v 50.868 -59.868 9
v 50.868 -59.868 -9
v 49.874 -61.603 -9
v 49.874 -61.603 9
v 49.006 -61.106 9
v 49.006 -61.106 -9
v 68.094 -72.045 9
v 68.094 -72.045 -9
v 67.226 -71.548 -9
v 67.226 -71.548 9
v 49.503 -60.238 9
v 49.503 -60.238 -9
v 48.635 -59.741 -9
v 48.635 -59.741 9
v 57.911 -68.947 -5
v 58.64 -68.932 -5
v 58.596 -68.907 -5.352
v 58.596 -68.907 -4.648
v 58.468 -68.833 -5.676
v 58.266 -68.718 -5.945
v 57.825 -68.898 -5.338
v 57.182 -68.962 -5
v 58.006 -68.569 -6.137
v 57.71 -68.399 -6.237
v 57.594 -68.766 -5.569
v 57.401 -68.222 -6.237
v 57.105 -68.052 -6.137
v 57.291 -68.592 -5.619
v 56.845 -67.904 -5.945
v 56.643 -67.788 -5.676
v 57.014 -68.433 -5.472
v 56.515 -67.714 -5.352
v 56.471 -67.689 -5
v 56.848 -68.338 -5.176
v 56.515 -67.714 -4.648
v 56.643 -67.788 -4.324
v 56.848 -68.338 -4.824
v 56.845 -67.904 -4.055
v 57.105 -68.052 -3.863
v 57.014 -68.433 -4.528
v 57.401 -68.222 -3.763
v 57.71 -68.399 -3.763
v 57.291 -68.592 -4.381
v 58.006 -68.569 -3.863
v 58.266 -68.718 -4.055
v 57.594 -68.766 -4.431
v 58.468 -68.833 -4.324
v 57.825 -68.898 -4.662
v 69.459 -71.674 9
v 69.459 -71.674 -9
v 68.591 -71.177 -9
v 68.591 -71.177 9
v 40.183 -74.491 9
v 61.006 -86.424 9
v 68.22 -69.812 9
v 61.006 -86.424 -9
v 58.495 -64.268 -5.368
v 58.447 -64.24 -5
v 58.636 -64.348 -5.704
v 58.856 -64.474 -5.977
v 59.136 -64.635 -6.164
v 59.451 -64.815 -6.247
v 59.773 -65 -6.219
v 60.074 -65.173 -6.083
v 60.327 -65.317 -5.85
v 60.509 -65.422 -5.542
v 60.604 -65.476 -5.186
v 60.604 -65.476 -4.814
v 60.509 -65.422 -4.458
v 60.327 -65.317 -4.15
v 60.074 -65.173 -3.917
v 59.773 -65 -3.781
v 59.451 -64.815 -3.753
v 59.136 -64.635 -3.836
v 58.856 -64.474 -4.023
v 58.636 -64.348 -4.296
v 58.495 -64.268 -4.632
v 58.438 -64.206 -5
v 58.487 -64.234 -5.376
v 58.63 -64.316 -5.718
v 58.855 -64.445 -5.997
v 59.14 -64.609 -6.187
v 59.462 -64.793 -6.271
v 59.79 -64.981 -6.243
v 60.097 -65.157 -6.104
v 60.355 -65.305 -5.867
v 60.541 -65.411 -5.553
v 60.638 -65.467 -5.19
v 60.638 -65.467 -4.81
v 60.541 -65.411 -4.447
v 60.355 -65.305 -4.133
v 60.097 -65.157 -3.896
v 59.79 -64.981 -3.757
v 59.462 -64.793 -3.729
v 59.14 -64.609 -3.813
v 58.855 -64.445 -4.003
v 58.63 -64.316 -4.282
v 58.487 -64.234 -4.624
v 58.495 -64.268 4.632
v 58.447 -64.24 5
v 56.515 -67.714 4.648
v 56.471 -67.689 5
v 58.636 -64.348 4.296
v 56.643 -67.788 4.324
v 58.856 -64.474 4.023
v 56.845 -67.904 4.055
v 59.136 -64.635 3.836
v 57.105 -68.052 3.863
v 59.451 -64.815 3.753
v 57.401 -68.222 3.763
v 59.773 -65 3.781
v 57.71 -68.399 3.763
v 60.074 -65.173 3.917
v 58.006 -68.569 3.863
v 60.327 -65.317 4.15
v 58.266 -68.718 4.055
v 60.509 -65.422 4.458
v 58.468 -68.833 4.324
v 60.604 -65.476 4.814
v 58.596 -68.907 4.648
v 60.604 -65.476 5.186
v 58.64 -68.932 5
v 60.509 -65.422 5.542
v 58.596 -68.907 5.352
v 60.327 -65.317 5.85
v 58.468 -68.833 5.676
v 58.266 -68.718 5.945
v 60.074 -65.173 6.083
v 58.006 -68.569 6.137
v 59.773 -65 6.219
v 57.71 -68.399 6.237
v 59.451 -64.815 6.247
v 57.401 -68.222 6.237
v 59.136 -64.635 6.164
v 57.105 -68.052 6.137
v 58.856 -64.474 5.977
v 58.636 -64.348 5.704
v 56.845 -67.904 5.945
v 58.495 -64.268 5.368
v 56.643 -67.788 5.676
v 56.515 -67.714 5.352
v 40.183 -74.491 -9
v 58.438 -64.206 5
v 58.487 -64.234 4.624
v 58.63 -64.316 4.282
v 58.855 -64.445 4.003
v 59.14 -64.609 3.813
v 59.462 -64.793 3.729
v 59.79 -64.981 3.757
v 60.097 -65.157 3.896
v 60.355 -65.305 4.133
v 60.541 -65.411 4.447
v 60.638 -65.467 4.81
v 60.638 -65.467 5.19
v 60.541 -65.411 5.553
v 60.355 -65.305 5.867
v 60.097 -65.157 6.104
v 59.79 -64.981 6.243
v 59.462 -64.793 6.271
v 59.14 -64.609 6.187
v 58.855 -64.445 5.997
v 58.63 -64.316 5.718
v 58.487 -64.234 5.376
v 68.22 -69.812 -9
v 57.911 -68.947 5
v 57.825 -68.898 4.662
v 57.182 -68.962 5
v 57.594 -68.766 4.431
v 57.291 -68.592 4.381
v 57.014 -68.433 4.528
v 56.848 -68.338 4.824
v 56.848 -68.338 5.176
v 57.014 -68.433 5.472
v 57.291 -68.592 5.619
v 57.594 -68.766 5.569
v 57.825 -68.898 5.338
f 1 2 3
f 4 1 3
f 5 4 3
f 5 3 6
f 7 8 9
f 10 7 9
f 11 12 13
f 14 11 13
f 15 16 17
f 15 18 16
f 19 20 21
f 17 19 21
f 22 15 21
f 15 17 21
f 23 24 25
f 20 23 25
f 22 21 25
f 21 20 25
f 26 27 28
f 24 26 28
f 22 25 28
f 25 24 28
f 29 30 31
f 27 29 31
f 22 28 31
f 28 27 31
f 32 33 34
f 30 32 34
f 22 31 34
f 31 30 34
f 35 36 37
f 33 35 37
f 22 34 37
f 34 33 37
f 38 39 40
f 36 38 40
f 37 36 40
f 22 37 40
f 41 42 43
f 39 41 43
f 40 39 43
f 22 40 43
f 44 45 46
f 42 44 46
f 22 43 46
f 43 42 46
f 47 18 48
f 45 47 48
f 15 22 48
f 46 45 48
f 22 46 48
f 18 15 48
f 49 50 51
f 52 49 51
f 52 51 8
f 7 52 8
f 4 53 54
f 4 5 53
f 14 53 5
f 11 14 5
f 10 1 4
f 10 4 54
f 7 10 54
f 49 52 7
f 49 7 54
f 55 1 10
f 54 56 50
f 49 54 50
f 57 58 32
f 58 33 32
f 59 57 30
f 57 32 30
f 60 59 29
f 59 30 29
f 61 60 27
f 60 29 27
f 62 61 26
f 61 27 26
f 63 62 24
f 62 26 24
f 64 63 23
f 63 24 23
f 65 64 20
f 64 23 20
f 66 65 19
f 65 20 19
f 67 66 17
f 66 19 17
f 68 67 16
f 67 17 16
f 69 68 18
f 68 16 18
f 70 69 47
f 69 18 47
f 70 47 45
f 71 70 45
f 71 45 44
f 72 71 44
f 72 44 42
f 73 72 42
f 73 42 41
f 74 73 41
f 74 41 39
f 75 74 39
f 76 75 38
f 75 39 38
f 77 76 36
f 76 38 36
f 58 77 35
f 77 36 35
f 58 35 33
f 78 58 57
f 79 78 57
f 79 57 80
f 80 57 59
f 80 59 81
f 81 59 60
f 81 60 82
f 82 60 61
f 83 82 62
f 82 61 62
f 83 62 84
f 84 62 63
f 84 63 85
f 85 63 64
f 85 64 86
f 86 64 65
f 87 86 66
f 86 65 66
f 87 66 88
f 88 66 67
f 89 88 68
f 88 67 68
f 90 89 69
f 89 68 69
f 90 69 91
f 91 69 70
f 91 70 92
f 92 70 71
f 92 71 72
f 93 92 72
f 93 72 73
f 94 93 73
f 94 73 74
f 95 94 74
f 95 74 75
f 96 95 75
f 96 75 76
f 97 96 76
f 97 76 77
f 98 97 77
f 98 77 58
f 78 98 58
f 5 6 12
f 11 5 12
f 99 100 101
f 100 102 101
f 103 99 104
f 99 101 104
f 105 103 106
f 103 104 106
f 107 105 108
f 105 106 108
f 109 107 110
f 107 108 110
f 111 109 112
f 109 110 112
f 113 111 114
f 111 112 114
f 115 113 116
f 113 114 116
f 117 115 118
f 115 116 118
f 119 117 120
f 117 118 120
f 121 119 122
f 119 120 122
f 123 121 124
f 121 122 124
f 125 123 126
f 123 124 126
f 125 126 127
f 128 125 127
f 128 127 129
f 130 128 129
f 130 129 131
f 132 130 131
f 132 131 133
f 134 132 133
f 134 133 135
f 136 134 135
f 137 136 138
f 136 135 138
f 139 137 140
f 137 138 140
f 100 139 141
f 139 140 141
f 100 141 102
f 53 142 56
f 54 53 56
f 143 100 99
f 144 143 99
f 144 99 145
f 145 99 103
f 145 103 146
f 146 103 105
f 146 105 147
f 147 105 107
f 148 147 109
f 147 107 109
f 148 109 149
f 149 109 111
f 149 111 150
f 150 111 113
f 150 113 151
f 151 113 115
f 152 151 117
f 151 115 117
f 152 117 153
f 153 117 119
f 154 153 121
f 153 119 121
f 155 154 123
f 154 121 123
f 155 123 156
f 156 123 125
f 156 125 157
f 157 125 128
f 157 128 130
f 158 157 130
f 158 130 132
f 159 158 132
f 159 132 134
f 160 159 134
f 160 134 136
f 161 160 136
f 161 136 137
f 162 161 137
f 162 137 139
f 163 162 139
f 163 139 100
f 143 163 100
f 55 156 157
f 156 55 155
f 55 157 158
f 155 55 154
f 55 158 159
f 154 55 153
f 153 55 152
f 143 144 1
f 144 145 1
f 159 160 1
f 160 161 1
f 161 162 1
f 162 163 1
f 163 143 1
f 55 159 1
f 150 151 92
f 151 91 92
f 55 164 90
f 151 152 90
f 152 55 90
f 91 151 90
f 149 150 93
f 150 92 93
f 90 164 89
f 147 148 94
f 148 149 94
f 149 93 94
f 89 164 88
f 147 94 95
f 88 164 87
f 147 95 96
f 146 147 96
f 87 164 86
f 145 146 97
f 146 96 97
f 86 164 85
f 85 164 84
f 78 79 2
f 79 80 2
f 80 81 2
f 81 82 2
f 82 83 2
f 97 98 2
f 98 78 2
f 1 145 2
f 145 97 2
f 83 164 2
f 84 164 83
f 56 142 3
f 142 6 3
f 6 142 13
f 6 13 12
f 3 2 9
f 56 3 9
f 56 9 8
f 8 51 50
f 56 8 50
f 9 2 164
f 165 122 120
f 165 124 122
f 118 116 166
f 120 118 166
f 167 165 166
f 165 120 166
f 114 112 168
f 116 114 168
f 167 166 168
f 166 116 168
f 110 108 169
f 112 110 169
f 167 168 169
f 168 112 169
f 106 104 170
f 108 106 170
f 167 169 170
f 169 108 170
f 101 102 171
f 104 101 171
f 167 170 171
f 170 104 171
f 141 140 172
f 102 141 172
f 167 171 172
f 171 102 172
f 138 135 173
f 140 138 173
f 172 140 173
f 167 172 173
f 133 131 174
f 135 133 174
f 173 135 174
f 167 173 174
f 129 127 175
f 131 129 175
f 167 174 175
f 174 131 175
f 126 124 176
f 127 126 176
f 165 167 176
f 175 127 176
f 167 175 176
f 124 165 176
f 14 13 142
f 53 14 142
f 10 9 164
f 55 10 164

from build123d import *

# Parameters (mm, degrees)
EXTRUDE_START                = -9
EXTRUDE_1_DEPTH              = 18
SKETCH_5_R                   = 1
CUT_EXTRUDE_1_DEPTH          = 3
HOLE_WIZARD_M3_1_D           = 2.5
HOLE_WIZARD_M3_1_DEPTH       = 4
HOLE_WIZARD_M3_1_CSINK_D     = 2.55
HOLE_WIZARD_M3_1_CSINK_ANGLE = 90
HOLE_WIZARD_M3_1_TIP         = 0.751075774


# Read off the part's stored shape, not the designer's step: 凸台-拉伸1
with BuildPart() as part:
    # 凸台-拉伸1 outline → 凸台-拉伸1 (new body)
    with BuildSketch(Plane.XY.offset(EXTRUDE_START)):
        Polygon((67.226055932, -71.547534757), (68.220489275, -69.812281944), (50.867961141, -59.867948514), (49.873527798, -61.603201327), (49.005901391, -61.105984655), (49.503118063, -60.238358249), (48.635491656, -59.741141577), (40.18280824, -74.490790491), (61.005842001, -86.423990607), (69.458525416, -71.674341694), (68.59089901, -71.177125022), (68.093682338, -72.044751429), align=None)
    extrude(amount=EXTRUDE_1_DEPTH)

    # 草图5 → 切除-拉伸1 (cut)
    with BuildSketch(Plane(origin=(-13.251129944, -23.122777084, 0), x_dir=(0.8676264066772513, -0.49721667151888715, 0), z_dir=(0.49721667151888715, 0.8676264066772513, 0))):
        with Locations(Location((83.90172843, 5, 0), (0, 0, 180))):
            Circle(SKETCH_5_R)
        with Locations(Location((83.90172843, -5, 0), (0, 0, 180))):
            Circle(SKETCH_5_R)
    extrude(amount=-CUT_EXTRUDE_1_DEPTH, mode=Mode.SUBTRACT)

    # M3 螺纹孔的螺纹孔钻头1
    with Locations(Plane(origin=(-13.251129944, -23.122777084, 0), x_dir=(0.8676264066772513, -0.49721667151888715, 0), z_dir=(0.49721667151888715, 0.8676264066772513, 0))):
        with Locations((83.90172843, 5), (83.90172843, -5)):
            CounterSinkHole(HOLE_WIZARD_M3_1_D / 2, HOLE_WIZARD_M3_1_CSINK_D / 2, depth=HOLE_WIZARD_M3_1_DEPTH, counter_sink_angle=HOLE_WIZARD_M3_1_CSINK_ANGLE)
            with Locations((0, 0, -(HOLE_WIZARD_M3_1_DEPTH + HOLE_WIZARD_M3_1_TIP / 2))):  # 118° drill point
                Cone(0, HOLE_WIZARD_M3_1_D / 2, HOLE_WIZARD_M3_1_TIP, mode=Mode.SUBTRACT)


solid = part.part
